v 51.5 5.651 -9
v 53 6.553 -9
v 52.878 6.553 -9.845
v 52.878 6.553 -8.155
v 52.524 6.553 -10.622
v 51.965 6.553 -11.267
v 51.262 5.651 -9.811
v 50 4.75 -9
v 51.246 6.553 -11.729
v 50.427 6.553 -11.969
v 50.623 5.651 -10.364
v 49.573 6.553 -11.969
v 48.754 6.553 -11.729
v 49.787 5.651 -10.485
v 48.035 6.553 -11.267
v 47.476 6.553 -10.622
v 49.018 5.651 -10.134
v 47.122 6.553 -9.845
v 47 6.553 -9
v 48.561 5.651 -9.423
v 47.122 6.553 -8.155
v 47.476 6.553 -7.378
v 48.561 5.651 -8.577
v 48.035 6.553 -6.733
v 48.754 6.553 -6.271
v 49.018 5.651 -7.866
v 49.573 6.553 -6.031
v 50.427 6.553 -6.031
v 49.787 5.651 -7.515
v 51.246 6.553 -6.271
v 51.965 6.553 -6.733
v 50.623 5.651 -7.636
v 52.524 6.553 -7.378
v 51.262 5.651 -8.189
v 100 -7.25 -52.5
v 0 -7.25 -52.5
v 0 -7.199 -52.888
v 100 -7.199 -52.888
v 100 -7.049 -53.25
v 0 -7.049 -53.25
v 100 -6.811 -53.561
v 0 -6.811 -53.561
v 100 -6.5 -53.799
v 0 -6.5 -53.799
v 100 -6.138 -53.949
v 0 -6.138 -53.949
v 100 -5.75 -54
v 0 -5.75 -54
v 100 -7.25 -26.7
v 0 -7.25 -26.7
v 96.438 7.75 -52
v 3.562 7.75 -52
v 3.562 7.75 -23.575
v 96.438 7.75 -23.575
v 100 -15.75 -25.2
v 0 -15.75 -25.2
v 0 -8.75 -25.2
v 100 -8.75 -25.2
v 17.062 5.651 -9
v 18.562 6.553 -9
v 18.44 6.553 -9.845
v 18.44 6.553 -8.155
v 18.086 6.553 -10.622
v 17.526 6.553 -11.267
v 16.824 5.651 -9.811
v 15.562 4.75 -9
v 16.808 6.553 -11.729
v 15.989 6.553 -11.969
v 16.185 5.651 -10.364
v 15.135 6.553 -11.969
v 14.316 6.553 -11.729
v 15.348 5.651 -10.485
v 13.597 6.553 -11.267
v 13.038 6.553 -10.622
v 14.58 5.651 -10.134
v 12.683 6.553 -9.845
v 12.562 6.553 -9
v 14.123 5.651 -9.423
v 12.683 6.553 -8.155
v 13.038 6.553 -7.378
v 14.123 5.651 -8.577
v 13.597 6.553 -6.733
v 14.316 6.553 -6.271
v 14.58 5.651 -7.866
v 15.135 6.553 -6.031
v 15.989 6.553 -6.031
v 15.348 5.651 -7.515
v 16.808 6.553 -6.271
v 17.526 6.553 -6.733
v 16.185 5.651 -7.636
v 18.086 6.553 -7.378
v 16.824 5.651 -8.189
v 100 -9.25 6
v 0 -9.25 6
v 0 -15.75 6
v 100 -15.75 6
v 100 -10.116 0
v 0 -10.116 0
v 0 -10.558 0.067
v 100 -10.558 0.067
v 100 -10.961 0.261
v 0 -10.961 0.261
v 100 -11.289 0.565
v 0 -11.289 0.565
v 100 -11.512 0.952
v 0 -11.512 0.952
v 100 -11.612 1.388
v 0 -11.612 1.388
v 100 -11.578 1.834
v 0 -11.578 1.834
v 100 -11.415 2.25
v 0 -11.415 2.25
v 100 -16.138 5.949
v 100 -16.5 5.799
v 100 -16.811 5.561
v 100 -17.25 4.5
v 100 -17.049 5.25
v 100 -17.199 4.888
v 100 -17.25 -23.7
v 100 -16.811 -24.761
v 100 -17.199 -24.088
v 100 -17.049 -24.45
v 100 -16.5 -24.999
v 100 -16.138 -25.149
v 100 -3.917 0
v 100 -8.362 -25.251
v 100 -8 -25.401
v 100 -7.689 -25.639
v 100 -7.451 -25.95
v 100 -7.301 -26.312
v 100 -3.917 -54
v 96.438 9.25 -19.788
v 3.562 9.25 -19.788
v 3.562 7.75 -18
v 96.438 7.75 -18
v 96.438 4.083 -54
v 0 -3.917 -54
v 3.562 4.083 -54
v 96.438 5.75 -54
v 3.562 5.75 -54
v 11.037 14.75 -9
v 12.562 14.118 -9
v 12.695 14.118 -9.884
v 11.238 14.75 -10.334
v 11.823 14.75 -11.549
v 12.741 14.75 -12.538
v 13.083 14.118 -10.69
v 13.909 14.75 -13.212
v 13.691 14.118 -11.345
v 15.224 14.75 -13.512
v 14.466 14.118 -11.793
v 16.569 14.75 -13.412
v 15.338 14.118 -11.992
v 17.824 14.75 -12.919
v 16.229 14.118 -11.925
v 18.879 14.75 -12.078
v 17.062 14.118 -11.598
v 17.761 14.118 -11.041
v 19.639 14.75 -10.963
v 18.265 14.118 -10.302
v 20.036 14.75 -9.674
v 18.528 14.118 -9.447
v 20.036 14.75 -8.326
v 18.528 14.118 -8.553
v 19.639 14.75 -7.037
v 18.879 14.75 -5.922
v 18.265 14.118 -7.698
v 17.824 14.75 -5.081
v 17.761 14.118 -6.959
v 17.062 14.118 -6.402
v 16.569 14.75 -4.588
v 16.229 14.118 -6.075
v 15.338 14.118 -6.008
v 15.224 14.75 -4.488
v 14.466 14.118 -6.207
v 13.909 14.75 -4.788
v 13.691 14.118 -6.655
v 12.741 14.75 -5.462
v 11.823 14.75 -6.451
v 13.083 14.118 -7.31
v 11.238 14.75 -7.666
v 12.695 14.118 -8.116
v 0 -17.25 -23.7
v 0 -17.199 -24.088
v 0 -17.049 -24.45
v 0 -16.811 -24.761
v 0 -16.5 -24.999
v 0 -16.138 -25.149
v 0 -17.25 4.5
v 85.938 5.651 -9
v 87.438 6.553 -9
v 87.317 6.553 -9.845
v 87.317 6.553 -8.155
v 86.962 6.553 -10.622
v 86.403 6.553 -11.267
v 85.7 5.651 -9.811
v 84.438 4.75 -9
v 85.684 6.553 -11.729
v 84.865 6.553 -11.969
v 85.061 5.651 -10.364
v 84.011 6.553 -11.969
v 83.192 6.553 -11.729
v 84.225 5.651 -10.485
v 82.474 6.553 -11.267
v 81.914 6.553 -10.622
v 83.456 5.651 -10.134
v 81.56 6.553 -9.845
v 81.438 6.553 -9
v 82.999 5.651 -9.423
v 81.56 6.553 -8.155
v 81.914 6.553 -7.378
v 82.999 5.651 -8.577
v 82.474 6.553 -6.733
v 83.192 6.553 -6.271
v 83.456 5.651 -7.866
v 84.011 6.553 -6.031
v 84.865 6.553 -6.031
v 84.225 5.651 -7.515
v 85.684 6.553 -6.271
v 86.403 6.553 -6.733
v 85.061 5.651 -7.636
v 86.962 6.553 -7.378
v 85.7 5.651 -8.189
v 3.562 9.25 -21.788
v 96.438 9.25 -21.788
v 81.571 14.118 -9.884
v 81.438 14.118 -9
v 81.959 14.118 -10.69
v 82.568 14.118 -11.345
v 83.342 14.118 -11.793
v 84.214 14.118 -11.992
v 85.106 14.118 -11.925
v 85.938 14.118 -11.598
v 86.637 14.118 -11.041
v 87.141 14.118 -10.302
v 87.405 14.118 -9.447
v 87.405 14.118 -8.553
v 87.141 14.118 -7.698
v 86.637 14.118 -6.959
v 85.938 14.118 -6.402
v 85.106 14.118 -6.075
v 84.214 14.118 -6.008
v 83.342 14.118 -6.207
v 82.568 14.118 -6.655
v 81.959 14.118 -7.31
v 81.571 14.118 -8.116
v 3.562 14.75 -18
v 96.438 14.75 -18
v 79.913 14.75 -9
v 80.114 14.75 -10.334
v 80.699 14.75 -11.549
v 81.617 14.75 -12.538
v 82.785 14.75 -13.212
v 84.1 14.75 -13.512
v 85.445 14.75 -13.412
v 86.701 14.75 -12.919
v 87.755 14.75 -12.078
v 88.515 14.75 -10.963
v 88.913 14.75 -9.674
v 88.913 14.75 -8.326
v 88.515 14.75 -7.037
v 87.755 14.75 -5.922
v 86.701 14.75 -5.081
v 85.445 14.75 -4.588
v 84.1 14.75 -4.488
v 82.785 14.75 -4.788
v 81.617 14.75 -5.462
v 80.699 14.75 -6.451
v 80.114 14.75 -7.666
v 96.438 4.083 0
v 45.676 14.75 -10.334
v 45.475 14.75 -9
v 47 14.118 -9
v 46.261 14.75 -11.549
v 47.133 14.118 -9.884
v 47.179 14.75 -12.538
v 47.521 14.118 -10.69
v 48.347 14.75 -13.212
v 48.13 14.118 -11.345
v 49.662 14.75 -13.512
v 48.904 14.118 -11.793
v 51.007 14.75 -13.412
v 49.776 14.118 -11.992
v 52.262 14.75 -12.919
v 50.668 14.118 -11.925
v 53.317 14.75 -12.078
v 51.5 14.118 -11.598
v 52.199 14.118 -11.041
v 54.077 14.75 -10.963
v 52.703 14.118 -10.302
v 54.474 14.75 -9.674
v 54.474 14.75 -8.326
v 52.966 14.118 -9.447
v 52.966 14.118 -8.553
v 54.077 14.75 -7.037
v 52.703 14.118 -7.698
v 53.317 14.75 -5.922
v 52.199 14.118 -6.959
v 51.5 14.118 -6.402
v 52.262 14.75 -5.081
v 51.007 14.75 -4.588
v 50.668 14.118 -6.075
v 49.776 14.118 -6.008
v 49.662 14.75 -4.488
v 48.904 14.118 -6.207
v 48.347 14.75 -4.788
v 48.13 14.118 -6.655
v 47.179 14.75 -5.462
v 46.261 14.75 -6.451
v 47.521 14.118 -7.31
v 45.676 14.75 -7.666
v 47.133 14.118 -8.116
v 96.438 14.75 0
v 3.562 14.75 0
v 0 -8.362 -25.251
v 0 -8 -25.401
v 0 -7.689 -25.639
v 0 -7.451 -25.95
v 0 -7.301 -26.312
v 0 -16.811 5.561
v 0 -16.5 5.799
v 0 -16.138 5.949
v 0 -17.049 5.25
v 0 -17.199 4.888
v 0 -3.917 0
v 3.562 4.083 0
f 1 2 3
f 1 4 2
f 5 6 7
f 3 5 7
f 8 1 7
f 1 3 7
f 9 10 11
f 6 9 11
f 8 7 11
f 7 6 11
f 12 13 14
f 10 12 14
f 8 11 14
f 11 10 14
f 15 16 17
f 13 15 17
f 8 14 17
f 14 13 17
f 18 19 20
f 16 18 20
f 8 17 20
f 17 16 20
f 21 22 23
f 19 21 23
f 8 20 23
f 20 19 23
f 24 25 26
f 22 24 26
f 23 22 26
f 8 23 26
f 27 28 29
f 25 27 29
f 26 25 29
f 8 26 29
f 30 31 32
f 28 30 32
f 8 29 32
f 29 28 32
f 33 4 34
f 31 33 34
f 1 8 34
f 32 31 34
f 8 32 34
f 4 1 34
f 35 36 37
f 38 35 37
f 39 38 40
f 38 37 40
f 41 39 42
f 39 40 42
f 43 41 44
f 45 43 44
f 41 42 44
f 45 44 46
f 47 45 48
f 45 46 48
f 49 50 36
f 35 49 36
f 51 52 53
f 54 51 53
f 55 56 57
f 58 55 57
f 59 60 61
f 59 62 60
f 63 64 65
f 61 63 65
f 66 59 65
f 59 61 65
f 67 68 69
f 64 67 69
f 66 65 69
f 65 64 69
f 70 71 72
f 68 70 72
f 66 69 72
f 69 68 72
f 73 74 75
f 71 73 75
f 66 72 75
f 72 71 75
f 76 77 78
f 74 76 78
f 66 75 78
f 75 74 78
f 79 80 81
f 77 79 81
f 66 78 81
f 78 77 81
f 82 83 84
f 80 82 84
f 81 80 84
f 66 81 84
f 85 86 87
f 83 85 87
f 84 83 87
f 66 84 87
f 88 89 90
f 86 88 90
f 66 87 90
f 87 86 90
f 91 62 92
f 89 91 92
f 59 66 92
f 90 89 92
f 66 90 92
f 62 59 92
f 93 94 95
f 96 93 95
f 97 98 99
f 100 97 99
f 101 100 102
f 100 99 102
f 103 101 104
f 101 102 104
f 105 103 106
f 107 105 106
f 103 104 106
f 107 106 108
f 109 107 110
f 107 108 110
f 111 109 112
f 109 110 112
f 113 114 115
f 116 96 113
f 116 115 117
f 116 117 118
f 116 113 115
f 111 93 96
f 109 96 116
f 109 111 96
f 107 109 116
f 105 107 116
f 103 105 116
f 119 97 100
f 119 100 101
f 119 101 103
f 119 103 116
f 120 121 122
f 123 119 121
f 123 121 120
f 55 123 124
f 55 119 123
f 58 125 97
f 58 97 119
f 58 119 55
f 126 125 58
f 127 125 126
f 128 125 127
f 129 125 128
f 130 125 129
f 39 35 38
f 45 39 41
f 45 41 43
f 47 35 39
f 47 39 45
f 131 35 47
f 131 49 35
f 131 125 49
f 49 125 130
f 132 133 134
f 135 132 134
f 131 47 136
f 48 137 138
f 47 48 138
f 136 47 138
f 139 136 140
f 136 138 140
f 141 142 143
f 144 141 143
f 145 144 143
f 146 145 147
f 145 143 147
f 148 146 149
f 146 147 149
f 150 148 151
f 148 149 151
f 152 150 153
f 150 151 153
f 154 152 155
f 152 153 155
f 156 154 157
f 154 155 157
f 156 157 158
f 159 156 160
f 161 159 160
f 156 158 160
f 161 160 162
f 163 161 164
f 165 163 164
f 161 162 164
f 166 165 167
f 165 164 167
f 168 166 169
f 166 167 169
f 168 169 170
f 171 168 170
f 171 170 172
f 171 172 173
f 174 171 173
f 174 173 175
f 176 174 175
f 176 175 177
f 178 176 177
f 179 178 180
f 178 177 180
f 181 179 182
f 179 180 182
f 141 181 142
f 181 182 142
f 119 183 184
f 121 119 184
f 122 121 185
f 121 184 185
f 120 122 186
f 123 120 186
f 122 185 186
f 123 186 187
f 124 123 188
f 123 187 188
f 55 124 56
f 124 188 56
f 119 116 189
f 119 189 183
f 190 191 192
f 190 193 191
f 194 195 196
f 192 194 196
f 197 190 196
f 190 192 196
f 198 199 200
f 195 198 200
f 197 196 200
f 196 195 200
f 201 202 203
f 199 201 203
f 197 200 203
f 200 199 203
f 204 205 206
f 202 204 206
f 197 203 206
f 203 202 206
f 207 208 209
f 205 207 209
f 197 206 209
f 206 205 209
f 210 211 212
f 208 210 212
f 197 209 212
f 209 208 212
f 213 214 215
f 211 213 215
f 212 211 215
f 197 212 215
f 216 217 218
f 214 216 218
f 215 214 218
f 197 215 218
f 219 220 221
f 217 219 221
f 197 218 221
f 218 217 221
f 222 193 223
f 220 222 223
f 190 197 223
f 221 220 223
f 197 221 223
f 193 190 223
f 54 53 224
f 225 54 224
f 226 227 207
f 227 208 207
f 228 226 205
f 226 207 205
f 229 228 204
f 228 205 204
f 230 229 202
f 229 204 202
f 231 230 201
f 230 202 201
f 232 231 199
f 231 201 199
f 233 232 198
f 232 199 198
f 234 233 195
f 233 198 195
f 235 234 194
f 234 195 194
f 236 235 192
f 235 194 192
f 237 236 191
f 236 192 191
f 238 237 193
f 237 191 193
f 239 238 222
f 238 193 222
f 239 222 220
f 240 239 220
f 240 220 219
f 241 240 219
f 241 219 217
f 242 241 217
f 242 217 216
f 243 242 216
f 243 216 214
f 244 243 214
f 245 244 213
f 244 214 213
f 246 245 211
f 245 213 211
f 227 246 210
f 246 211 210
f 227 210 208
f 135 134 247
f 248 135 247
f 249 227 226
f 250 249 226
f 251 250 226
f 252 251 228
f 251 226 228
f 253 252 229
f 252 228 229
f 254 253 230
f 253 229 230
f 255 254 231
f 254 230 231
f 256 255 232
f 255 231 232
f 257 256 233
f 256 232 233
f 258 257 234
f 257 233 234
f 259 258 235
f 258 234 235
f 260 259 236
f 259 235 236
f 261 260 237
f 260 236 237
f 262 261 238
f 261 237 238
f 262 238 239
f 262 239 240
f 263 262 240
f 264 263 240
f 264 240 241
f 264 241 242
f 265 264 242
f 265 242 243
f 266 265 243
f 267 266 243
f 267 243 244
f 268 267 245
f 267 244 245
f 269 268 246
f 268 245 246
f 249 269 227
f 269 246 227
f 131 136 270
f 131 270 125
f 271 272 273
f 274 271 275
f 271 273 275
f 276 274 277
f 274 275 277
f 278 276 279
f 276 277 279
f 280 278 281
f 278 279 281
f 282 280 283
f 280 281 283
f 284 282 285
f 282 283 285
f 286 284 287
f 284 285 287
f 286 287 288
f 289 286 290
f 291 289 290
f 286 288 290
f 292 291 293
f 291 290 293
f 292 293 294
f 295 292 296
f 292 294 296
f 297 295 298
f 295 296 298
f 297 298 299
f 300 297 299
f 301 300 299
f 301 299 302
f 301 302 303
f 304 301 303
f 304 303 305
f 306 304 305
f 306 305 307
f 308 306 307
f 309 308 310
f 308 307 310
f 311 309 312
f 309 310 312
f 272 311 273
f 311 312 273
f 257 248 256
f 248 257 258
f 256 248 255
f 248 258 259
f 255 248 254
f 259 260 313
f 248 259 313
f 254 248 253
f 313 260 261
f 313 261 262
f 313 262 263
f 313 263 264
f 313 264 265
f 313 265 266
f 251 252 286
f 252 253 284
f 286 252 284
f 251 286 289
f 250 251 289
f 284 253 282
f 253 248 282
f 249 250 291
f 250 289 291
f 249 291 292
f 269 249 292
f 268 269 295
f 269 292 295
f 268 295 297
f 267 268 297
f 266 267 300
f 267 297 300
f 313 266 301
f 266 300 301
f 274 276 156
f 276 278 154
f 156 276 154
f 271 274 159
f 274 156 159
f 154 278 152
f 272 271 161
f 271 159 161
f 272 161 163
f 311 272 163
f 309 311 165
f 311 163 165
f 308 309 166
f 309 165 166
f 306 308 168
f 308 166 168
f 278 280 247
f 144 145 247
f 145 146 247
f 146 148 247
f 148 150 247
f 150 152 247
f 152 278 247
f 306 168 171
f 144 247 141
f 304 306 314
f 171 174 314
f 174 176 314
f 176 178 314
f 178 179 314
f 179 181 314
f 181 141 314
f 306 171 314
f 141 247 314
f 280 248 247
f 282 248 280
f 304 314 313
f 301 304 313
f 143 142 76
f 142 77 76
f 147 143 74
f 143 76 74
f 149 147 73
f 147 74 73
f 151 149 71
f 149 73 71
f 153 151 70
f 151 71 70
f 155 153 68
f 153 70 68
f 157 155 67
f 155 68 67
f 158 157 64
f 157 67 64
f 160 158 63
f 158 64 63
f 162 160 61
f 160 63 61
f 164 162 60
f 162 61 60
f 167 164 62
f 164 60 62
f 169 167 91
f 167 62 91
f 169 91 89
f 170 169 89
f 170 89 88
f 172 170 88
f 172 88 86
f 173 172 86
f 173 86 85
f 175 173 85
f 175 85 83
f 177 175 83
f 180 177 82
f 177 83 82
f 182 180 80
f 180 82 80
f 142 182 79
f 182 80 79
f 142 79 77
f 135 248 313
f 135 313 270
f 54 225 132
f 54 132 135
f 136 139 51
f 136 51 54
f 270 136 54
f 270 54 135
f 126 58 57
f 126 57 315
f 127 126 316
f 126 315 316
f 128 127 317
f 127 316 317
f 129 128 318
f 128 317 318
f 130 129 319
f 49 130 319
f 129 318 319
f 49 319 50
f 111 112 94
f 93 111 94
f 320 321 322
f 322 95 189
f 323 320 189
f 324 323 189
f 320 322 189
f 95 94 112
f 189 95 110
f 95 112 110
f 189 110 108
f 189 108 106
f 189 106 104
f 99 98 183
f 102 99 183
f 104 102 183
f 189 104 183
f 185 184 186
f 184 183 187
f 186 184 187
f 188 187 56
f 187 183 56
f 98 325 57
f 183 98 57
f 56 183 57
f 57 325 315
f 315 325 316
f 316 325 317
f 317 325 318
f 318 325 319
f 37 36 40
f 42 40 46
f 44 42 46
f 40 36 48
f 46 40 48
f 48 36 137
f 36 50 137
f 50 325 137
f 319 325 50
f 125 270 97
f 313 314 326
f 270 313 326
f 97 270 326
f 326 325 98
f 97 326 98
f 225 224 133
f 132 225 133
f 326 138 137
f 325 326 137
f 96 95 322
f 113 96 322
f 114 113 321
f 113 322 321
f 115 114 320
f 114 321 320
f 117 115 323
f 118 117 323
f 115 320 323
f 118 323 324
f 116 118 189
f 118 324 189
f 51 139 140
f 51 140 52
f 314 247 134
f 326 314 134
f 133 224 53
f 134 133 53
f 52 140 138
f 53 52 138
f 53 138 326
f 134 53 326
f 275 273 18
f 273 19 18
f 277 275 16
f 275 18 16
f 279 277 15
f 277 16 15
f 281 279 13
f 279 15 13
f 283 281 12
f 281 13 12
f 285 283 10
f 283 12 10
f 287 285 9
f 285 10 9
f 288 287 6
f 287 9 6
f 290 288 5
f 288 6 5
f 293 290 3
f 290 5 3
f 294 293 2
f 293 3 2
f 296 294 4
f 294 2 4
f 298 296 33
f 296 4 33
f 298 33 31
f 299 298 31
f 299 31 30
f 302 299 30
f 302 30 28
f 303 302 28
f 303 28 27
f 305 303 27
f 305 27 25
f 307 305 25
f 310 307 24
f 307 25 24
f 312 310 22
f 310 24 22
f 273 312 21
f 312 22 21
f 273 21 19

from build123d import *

# Parameters (mm, degrees)
BOSS_EXTRUDE1_DEPTH             = 100
CUT_EXTRUDE1_DEPTH              = 115.950260983
CUT_EXTRUDE1_DEPTH_BACK         = 115.950260983
F_6_0MM_DOWEL_HOLE1_D           = 6
F_6_0MM_DOWEL_HOLE1_DEPTH       = 8.197418143
F_6_0MM_DOWEL_HOLE1_CSINK_D     = 6.05
F_6_0MM_DOWEL_HOLE1_CSINK_ANGLE = 90
F_6_0MM_DOWEL_HOLE1_TIP         = 1.802581857
CHAMFER1_SIZE                   = 1.5


with BuildPart() as part:
    # Sketch1 → Boss-Extrude1 (new body)
    with BuildSketch(Plane(origin=(0, 0, 0), x_dir=(0, 0, -1), z_dir=(1, 0, 0))):
        with BuildLine():
            Line((-6, -9.25), (-6, -15.75))
            ThreePointArc((-6, -15.75), (-5.560660172, -16.810660172), (-4.5, -17.25))
            Line((-4.5, -17.25), (23.7, -17.25))
            ThreePointArc((23.7, -17.25), (24.760660172, -16.810660172), (25.2, -15.75))
            Line((25.2, -15.75), (25.2, -8.75))
            ThreePointArc((25.2, -8.75), (25.639339828, -7.689339828), (26.7, -7.25))
            Line((26.7, -7.25), (52.5, -7.25))
            ThreePointArc((52.5, -7.25), (53.560660172, -6.810660172), (54, -5.75))
            Line((54, -5.75), (54, 5.75))
            Line((54, 5.75), (52, 7.75))
            Line((52, 7.75), (23.575260778, 7.75))
            Line((23.575260778, 7.75), (21.787630389, 9.25))
            Line((21.787630389, 9.25), (19.787630389, 9.25))
            Line((19.787630389, 9.25), (18, 7.75))
            Line((18, 7.75), (18, 14.75))
            Line((18, 14.75), (0, 14.75))
            Line((0, 14.75), (0, -10.116025404))
            ThreePointArc((0, -10.116025404), (-0.75, -11.415063509), (-2.25, -11.415063509))
            Line((-2.25, -11.415063509), (-6, -9.25))
        make_face()
    extrude(amount=BOSS_EXTRUDE1_DEPTH)

    # Sketch2 → Cut-Extrude1 (cut, two sides: drawn at the far end of the back side and taken through both)
    with BuildSketch(Plane.XY.offset(-CUT_EXTRUDE1_DEPTH_BACK)):
        Polygon((96.438170518, 14.75), (96.438170518, 4.083333333), (100, -3.916666667), (100, 14.75), align=None)
        Polygon((0, 14.75), (3.561829482, 14.75), (3.561829482, 4.083333333), (0, -3.916666667), align=None)
    extrude(amount=CUT_EXTRUDE1_DEPTH + CUT_EXTRUDE1_DEPTH_BACK, mode=Mode.SUBTRACT)

    # Ø6.0mm Dowel Hole1
    with Locations(Plane(origin=(0, 14.75, 0), x_dir=(1, 0, 0), z_dir=(0, 1, 0))):
        with Locations((15.561829482, 9), (50, 9), (84.438170518, 9)):
            CounterSinkHole(F_6_0MM_DOWEL_HOLE1_D / 2, F_6_0MM_DOWEL_HOLE1_CSINK_D / 2, depth=F_6_0MM_DOWEL_HOLE1_DEPTH, counter_sink_angle=F_6_0MM_DOWEL_HOLE1_CSINK_ANGLE)
            with Locations((0, 0, -(F_6_0MM_DOWEL_HOLE1_DEPTH + F_6_0MM_DOWEL_HOLE1_TIP / 2))):  # 118° drill point
                Cone(0, F_6_0MM_DOWEL_HOLE1_D / 2, F_6_0MM_DOWEL_HOLE1_TIP, mode=Mode.SUBTRACT)

    # Chamfer1
    # the kernel refuses this chamfer: 1.5 mm, written as the material it takes off along each edge
    with BuildSketch(Plane(origin=(84.438170518, 14.75, -9), x_dir=(-1, 0, 0), z_dir=(0, 0, 1))) as chamfer1_piece_1:
        Polygon((3.025 + CHAMFER1_SIZE, 0), (3.025 - CHAMFER1_SIZE * 0.707106781187, CHAMFER1_SIZE * 0.707106781187), (3.025, 0), align=None)
    revolve(axis=Axis((84.438170518, 14.75, -9), (0, -1, 0)), mode=Mode.SUBTRACT)
    with BuildSketch(Plane(origin=(50, 14.75, -9), x_dir=(-1, 0, 0), z_dir=(0, 0, 1))) as chamfer1_piece_2:
        Polygon((3.025 + CHAMFER1_SIZE, 0), (3.025 - CHAMFER1_SIZE * 0.707106781187, CHAMFER1_SIZE * 0.707106781187), (3.025, 0), align=None)
    revolve(axis=Axis((50, 14.75, -9), (0, -1, 0)), mode=Mode.SUBTRACT)
    with BuildSketch(Plane(origin=(15.561829482, 14.75, -9), x_dir=(-1, 0, 0), z_dir=(0, 0, 1))) as chamfer1_piece_3:
        Polygon((3.025 + CHAMFER1_SIZE, 0), (3.025 - CHAMFER1_SIZE * 0.707106781187, CHAMFER1_SIZE * 0.707106781187), (3.025, 0), align=None)
    revolve(axis=Axis((15.561829482, 14.75, -9), (0, -1, 0)), mode=Mode.SUBTRACT)


solid = part.part
